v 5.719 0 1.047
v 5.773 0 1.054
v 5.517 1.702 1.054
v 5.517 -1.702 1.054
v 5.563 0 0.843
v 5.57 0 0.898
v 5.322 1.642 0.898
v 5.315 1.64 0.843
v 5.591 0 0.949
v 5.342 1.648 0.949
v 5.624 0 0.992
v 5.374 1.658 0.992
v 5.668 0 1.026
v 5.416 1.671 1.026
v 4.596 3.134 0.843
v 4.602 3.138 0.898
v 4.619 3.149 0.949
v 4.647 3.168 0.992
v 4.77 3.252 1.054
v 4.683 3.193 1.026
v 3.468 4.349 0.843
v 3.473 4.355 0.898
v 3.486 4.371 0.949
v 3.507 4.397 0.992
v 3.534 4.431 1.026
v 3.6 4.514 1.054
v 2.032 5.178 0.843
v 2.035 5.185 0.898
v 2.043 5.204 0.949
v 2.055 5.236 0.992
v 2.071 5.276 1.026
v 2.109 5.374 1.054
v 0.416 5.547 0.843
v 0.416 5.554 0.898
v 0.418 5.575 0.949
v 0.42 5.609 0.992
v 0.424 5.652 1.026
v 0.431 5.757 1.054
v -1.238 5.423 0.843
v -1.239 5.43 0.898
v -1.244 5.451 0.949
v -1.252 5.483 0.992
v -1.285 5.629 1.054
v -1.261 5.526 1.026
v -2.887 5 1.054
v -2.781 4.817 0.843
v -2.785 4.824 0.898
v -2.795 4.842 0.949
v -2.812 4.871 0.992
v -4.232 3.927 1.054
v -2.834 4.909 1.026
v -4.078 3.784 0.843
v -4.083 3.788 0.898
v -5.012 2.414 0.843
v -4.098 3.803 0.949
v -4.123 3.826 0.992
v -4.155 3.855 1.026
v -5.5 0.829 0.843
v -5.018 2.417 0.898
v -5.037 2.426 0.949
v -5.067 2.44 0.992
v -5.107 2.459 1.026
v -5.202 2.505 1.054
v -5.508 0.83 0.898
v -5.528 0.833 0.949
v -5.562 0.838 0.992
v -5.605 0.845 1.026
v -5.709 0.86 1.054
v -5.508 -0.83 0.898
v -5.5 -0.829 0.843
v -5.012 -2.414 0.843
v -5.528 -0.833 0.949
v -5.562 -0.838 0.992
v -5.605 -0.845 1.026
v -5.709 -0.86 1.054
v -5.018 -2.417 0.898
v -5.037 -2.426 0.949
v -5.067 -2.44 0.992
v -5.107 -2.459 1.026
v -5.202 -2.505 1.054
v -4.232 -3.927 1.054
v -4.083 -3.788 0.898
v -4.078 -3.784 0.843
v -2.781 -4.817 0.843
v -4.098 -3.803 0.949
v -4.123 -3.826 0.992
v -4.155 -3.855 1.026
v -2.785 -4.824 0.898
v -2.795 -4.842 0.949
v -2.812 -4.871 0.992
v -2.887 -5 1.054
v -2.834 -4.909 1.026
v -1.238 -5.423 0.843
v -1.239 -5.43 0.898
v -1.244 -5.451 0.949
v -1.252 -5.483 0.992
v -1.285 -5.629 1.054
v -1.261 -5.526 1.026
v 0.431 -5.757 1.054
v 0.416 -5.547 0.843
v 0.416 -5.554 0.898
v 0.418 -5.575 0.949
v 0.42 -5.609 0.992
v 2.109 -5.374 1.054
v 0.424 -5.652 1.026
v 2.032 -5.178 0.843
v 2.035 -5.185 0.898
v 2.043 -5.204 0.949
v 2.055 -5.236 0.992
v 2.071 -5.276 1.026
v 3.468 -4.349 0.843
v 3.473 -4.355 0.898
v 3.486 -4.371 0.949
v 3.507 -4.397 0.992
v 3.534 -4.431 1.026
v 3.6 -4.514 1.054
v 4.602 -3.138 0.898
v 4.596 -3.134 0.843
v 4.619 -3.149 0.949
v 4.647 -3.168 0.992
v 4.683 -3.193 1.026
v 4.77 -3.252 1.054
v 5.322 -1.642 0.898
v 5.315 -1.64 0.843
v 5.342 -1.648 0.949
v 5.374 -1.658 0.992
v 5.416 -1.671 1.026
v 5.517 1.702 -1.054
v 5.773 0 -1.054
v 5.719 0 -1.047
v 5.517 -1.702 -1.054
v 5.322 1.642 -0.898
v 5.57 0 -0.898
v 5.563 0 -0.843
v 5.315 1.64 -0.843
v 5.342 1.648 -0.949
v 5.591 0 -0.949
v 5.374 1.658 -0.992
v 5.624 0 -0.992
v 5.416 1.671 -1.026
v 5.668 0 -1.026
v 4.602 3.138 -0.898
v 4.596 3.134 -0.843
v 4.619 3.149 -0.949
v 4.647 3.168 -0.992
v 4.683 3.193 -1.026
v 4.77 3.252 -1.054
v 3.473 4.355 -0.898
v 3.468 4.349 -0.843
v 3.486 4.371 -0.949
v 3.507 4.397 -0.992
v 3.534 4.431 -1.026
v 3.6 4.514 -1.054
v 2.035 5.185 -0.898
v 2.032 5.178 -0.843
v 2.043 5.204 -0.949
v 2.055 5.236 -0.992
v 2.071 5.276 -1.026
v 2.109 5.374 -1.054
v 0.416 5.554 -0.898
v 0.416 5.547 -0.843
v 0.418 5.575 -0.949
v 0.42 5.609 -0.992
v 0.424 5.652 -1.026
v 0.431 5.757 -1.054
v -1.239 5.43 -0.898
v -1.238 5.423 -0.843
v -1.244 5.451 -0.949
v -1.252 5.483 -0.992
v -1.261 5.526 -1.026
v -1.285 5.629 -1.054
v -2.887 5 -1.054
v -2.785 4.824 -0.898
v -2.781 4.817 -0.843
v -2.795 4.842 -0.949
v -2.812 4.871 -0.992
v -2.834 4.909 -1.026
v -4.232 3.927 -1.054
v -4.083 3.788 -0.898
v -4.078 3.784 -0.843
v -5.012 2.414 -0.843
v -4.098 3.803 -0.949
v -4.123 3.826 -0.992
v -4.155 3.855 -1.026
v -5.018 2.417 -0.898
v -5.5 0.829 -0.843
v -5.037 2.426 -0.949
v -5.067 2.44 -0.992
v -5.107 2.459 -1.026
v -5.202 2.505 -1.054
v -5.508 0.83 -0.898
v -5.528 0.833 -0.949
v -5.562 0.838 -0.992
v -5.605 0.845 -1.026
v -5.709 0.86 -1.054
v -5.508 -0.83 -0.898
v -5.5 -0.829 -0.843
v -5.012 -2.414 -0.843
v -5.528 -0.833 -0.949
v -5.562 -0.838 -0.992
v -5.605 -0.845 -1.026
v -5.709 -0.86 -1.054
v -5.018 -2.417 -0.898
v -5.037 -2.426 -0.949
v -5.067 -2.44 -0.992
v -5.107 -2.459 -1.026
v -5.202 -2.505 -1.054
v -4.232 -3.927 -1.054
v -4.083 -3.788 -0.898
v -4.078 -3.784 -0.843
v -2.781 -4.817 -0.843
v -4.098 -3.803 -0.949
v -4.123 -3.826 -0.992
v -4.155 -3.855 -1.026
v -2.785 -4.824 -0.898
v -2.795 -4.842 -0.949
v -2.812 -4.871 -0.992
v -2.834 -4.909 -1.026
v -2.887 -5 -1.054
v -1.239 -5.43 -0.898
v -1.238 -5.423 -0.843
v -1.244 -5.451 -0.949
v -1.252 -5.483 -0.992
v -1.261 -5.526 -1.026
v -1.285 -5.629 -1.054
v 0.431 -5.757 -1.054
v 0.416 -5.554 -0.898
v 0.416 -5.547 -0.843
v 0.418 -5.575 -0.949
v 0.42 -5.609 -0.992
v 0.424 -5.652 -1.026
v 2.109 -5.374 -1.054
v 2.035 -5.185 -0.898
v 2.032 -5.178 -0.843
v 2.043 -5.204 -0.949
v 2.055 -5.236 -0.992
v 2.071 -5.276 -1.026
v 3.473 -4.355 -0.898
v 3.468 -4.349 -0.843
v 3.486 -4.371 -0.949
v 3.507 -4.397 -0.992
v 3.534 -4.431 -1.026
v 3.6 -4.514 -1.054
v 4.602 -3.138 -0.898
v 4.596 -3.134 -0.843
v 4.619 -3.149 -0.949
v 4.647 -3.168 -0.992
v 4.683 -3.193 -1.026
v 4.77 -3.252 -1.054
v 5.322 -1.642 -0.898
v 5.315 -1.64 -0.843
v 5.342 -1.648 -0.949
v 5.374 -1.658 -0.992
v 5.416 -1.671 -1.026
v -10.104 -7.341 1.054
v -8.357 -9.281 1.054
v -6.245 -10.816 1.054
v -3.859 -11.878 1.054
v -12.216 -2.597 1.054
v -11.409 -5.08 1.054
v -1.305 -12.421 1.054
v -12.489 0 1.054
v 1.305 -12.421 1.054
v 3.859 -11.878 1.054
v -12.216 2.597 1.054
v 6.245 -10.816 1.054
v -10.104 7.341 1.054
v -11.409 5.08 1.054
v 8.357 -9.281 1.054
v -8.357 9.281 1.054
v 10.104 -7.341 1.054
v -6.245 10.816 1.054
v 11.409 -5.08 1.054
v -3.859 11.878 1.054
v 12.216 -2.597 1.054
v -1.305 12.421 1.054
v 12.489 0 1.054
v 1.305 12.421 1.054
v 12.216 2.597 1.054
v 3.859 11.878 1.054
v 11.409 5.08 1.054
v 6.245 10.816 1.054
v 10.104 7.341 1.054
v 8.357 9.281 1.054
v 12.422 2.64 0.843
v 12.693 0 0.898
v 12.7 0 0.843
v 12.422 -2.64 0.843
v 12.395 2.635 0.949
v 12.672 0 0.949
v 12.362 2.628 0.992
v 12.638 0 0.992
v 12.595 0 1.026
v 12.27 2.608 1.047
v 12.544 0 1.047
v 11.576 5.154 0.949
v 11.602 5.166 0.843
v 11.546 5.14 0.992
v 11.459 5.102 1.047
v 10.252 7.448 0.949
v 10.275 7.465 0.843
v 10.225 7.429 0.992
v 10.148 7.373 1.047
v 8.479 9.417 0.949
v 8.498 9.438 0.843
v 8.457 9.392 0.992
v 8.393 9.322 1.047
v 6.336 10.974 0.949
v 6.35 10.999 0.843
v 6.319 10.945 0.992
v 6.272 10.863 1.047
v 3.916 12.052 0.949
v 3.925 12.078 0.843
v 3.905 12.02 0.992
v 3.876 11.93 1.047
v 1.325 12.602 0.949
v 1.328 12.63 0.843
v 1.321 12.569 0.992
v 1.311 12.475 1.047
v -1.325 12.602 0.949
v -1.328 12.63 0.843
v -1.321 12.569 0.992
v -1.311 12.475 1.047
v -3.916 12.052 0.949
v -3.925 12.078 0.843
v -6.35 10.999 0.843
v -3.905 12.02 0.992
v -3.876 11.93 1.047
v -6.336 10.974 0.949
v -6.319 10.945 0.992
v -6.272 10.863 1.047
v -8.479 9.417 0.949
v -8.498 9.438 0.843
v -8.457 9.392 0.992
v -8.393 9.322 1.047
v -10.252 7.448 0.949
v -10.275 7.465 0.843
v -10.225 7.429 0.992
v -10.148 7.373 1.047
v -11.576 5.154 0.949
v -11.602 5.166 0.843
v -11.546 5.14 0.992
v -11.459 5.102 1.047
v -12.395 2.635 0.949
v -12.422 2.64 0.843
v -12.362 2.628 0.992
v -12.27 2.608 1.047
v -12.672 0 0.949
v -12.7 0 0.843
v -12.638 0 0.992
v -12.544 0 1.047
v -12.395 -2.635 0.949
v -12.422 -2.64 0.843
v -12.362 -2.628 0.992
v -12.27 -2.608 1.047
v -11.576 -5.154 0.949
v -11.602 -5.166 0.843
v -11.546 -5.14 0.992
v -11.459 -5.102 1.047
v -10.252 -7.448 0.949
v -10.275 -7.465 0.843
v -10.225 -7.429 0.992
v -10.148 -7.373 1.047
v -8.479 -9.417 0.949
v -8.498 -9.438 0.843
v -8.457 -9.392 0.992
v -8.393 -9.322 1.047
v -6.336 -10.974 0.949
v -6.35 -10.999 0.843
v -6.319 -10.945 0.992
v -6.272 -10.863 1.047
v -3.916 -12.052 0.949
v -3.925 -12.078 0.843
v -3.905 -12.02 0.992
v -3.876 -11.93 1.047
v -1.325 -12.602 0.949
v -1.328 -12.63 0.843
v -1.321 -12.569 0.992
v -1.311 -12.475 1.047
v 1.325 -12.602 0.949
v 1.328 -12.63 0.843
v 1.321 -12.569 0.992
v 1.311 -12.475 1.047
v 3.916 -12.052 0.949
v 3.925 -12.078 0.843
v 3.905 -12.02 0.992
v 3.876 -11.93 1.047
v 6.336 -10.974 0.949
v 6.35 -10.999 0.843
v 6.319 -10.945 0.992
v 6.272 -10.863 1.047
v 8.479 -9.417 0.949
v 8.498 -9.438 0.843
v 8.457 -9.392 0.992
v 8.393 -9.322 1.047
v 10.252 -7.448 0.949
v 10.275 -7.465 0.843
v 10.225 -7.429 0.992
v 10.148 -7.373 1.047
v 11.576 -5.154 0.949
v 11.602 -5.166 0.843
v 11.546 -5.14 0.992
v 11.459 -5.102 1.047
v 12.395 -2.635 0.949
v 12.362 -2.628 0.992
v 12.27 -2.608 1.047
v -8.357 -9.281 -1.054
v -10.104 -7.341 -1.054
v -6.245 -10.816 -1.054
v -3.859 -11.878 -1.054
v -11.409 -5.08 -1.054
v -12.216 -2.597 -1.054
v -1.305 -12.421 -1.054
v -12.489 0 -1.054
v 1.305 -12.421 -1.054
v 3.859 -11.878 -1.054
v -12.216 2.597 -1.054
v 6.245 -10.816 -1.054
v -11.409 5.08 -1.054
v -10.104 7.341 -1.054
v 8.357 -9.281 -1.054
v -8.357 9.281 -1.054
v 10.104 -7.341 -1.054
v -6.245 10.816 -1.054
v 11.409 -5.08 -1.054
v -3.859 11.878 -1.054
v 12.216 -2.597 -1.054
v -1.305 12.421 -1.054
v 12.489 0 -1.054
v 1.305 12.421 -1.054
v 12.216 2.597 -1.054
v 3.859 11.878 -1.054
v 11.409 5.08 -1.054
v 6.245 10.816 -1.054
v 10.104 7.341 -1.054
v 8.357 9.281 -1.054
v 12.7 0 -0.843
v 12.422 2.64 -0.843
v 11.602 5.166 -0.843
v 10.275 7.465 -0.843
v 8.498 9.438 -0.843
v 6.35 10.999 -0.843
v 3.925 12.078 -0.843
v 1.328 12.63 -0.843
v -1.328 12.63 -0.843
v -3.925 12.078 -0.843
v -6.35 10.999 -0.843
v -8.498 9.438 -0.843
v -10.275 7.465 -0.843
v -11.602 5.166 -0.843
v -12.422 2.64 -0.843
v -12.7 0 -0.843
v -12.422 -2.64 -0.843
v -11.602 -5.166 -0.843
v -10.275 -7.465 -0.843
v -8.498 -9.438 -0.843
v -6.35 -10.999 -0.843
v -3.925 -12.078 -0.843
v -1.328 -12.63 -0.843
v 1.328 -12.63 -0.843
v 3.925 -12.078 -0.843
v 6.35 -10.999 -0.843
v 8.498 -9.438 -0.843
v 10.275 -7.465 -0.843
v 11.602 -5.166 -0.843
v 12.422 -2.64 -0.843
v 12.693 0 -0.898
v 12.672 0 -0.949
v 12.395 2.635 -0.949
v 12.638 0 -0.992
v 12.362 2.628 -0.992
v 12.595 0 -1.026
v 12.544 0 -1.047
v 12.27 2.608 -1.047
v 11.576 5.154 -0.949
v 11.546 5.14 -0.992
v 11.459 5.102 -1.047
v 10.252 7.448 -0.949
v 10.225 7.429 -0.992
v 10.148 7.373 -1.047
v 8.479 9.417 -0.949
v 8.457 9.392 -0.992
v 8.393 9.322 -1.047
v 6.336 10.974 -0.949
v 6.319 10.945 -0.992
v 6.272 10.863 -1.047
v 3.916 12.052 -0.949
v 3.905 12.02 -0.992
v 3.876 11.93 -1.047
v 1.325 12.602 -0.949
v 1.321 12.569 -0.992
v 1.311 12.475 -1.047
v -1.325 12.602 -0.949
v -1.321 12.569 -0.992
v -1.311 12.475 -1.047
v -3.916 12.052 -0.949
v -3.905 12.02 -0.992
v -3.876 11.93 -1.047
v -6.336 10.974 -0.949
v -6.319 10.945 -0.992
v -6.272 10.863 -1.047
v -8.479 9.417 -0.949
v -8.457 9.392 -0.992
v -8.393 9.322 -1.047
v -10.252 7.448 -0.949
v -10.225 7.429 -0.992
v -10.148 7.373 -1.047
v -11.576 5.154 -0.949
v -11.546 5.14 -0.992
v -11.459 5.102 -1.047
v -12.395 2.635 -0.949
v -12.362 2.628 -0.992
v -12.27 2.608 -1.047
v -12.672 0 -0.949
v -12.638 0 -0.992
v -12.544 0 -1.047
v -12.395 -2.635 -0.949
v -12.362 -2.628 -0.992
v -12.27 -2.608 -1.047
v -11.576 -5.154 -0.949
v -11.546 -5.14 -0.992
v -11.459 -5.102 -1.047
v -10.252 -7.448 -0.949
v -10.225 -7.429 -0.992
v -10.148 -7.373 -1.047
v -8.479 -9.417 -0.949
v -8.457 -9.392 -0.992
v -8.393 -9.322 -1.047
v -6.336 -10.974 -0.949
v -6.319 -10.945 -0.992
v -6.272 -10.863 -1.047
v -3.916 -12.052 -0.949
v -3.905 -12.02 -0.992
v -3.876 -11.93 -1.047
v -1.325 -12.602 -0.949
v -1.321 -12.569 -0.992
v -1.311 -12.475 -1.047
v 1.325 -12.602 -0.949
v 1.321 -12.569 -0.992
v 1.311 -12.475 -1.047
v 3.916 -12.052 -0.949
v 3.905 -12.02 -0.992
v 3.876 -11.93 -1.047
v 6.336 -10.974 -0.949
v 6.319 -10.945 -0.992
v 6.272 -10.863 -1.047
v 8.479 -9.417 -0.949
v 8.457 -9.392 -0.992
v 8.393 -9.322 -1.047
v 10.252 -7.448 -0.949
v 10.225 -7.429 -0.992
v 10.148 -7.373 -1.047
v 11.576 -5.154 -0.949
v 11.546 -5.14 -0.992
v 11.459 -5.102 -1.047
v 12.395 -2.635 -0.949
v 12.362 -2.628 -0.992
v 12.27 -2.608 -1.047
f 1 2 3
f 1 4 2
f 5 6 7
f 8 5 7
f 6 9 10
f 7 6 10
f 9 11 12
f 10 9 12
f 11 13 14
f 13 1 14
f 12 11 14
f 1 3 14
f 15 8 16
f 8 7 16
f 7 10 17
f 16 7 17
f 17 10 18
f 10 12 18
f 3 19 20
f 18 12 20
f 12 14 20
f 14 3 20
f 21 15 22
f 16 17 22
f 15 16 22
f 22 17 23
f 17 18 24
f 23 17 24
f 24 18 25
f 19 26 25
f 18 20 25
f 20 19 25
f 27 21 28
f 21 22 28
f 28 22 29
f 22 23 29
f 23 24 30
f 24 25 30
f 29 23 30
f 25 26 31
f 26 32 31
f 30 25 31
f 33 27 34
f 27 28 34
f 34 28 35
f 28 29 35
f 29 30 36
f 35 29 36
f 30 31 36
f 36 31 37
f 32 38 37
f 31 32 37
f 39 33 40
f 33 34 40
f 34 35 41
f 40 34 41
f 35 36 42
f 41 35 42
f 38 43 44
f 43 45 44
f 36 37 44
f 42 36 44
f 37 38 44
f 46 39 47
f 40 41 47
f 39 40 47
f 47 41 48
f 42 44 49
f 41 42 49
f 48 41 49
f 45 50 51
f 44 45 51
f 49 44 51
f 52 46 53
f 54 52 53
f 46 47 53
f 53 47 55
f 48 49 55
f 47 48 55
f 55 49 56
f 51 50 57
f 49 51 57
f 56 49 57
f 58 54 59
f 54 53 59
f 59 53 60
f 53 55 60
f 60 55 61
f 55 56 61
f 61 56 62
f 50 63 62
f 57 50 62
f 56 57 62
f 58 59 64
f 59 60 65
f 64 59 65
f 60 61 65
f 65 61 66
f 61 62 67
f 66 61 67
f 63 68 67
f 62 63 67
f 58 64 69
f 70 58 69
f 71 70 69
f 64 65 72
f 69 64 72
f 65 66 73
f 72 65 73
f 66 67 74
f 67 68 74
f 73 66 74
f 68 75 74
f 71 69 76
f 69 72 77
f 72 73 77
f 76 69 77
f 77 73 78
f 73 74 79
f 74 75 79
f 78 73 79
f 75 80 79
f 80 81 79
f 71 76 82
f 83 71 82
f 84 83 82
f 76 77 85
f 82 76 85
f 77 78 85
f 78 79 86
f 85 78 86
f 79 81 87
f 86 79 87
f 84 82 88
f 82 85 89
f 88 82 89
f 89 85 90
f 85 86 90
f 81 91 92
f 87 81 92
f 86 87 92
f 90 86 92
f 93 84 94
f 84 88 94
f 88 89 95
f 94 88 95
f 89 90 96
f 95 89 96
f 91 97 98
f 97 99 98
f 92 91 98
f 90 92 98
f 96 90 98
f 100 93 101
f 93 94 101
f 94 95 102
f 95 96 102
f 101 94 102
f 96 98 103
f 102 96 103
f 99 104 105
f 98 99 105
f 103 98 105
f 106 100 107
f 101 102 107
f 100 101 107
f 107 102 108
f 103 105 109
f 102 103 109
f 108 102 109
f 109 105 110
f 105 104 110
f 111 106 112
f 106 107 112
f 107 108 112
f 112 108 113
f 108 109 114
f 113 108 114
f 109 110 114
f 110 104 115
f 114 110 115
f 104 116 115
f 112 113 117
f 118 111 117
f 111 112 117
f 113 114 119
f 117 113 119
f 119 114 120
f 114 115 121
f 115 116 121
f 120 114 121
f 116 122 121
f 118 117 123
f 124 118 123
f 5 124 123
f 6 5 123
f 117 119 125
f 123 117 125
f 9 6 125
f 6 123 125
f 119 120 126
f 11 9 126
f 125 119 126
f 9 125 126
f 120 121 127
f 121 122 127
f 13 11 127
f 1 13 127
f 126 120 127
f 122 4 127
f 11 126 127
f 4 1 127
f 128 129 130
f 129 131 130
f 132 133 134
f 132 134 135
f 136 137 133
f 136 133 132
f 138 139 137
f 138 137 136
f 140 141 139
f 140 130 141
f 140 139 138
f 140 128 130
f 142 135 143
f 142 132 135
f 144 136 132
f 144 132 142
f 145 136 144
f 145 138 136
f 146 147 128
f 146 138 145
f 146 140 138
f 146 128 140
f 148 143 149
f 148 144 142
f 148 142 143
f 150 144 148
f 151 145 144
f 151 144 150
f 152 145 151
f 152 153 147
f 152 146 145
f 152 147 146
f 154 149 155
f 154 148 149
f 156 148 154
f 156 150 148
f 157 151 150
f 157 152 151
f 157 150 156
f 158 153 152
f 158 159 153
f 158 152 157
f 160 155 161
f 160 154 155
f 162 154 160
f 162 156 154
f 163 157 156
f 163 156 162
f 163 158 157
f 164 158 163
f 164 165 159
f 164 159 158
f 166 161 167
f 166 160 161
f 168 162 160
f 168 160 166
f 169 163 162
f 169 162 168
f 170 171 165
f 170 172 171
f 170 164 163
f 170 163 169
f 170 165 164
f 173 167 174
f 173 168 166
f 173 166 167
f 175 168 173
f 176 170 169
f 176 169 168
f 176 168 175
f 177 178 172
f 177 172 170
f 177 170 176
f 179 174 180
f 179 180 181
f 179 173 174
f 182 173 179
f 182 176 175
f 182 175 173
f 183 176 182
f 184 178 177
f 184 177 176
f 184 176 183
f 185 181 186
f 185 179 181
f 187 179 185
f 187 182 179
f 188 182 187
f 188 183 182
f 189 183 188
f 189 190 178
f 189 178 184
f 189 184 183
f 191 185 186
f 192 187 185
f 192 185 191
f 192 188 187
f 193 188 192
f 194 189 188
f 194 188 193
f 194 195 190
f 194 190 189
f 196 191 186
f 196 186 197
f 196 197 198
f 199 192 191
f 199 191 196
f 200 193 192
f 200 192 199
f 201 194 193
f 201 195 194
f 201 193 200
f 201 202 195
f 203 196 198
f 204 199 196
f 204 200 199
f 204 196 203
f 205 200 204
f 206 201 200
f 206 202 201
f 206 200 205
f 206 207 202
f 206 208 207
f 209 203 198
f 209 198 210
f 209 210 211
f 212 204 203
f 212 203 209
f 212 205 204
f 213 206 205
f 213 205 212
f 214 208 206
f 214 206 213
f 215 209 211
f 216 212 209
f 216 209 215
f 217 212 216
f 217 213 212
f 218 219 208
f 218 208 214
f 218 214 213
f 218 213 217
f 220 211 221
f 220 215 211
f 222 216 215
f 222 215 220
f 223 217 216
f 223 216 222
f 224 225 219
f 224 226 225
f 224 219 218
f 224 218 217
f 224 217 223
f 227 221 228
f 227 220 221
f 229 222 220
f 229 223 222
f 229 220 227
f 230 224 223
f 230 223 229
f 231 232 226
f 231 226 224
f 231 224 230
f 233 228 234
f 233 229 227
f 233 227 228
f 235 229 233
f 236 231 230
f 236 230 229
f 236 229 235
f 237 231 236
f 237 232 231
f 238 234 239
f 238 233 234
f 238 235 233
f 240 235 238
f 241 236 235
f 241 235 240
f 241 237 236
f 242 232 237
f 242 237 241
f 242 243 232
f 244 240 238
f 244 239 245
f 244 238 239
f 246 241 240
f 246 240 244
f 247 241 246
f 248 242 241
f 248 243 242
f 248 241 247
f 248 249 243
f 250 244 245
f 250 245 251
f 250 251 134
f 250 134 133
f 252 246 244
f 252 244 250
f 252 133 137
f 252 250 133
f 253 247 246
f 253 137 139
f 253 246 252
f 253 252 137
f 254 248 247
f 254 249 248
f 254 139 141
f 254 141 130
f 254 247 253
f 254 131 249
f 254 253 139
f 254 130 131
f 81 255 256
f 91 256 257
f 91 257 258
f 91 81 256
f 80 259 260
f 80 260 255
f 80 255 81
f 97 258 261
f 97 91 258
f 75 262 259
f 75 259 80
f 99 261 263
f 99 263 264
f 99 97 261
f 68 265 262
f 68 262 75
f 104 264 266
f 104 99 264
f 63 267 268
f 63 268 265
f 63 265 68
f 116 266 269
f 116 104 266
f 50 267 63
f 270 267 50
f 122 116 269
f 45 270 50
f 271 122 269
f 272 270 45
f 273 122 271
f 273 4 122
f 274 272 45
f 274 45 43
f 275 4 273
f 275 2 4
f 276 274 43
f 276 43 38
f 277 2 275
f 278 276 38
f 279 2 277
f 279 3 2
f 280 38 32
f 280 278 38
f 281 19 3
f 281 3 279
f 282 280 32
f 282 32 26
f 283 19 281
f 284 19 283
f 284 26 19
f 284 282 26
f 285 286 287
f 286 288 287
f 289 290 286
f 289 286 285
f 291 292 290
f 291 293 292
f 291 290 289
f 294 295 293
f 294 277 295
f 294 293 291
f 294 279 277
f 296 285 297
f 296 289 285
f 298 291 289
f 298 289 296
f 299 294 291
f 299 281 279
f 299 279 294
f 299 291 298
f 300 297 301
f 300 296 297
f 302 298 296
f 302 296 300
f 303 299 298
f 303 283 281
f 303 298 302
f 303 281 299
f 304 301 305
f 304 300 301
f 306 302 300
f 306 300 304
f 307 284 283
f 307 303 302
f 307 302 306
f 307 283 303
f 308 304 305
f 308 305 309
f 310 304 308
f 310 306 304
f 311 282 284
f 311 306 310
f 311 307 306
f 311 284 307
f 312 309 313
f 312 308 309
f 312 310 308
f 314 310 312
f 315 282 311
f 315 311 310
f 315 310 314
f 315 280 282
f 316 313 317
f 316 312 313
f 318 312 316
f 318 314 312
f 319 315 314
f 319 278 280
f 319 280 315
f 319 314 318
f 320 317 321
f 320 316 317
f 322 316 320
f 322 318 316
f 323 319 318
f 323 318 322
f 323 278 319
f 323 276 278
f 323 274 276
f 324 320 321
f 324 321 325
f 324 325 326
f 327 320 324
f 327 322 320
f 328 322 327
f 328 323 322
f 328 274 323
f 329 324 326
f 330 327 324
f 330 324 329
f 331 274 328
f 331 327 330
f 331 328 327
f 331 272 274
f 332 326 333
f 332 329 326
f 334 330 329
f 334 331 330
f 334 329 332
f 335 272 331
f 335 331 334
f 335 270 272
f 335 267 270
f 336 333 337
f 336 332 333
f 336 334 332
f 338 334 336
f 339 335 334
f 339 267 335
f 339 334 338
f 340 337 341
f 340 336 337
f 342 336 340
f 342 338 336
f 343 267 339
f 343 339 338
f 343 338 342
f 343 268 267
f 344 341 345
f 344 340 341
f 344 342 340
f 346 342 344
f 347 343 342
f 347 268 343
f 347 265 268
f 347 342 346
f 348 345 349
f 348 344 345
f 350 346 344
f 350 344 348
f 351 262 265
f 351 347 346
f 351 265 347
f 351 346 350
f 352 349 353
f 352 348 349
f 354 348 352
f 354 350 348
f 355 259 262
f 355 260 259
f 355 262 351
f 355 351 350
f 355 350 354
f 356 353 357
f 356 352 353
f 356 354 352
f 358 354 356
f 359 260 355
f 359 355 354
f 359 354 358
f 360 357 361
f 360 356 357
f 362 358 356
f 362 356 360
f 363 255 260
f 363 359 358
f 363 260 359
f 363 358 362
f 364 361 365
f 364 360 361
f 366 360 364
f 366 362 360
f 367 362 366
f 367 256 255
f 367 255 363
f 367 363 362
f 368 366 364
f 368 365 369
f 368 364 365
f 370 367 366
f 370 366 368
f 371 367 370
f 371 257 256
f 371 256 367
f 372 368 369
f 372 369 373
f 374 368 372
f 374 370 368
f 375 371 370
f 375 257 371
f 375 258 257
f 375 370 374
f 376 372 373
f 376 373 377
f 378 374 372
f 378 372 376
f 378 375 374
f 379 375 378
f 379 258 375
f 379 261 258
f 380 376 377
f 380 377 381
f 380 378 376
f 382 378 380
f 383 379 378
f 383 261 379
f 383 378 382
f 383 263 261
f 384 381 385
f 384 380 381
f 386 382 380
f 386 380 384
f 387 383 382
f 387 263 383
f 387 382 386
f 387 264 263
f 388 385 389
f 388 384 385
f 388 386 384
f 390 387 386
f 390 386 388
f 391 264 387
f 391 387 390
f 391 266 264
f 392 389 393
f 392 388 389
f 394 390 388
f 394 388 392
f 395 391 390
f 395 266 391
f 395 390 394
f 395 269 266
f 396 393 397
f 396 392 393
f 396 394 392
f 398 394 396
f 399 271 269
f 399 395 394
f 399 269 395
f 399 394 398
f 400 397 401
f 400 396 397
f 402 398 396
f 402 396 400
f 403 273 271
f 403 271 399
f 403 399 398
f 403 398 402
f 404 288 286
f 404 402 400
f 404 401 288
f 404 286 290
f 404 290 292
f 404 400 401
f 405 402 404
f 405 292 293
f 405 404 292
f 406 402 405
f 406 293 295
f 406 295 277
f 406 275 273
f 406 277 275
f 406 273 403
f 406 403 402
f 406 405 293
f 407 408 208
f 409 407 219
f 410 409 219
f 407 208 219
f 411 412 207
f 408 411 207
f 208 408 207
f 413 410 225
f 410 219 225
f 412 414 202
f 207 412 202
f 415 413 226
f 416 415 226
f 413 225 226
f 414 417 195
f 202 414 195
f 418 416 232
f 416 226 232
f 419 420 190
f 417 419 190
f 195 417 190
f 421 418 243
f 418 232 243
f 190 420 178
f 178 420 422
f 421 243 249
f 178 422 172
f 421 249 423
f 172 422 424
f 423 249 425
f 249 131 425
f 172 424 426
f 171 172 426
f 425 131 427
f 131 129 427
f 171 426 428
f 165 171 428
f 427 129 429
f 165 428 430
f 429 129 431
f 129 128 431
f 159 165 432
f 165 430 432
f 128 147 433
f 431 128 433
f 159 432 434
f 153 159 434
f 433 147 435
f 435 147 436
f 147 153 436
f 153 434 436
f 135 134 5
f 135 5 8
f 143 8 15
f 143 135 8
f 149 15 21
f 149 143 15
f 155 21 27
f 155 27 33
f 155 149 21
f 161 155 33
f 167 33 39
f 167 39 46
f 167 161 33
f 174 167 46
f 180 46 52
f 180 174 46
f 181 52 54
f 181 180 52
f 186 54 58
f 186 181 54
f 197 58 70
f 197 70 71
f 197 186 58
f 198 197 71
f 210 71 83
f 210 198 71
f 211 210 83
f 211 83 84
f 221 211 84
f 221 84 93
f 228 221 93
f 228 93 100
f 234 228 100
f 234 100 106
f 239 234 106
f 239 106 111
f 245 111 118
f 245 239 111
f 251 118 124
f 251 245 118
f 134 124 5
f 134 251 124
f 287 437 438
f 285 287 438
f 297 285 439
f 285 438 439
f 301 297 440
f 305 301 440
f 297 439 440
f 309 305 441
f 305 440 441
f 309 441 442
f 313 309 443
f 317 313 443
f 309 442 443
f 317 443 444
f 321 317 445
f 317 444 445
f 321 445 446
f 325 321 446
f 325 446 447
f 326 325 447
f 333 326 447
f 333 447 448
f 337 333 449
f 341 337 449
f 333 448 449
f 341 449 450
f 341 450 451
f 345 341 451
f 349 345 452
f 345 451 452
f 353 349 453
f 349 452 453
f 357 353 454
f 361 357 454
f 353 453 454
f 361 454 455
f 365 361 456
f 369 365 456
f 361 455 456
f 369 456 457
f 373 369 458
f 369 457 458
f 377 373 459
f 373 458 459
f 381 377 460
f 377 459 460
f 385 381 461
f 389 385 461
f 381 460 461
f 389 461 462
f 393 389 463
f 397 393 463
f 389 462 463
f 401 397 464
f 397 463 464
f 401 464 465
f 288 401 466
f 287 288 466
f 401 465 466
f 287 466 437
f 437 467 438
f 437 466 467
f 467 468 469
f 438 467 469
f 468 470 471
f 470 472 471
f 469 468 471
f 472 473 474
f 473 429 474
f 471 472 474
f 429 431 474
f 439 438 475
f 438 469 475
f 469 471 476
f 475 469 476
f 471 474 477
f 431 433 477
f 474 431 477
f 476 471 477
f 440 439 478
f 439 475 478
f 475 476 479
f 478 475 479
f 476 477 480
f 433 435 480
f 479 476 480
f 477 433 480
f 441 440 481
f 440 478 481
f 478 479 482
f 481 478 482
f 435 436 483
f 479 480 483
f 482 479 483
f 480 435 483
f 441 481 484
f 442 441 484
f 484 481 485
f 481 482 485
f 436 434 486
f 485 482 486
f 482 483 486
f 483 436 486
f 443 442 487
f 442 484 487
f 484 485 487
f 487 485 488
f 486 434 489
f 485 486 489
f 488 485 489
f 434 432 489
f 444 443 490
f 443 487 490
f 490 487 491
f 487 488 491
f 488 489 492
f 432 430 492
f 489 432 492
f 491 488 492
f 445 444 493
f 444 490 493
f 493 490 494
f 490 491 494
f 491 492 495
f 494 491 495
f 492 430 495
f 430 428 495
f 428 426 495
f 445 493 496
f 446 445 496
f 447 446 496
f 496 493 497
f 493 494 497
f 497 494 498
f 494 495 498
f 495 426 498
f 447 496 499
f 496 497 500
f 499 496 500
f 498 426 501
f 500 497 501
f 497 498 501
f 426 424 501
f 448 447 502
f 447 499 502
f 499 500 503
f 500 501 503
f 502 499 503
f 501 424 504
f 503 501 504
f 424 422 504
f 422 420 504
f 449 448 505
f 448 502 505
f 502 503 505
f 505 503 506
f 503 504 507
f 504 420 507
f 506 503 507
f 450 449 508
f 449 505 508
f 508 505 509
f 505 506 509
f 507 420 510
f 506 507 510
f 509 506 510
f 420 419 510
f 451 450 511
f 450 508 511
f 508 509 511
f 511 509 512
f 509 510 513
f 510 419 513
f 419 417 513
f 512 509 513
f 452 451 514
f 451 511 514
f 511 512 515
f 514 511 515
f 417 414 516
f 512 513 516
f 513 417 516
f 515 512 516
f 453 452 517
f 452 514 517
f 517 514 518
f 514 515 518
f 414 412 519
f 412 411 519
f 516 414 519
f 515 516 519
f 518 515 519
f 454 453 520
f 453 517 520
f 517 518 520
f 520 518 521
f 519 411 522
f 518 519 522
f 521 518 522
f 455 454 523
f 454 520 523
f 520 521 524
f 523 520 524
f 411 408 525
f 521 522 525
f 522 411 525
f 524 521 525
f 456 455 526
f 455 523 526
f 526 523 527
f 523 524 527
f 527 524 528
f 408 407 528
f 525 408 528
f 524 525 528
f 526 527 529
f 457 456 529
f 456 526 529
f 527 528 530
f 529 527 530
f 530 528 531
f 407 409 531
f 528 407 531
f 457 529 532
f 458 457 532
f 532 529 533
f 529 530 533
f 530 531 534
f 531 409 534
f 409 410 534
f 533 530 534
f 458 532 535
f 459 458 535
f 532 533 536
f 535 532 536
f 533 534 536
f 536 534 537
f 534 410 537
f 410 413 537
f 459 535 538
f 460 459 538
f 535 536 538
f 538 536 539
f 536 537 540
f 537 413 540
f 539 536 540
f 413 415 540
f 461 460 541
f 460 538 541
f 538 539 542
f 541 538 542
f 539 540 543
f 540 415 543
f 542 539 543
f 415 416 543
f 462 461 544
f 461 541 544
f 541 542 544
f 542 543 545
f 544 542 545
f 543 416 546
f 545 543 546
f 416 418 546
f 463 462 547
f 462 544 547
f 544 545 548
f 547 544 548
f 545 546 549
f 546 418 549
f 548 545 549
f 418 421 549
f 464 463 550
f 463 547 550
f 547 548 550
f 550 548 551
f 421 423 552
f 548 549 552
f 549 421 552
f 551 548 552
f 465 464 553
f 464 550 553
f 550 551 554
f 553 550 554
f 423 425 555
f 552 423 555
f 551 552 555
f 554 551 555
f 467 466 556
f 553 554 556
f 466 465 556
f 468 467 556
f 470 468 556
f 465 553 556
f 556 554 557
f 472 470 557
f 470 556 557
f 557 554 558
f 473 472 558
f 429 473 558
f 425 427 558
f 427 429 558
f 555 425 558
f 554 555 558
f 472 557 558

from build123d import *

# Parameters (mm, degrees)
BOSS_EXTRUDE1_DEPTH      = 1.0541
BOSS_EXTRUDE1_DEPTH_BACK = 1.0541
SKETCH3_R                = 12.7
SKETCH3_R_2              = 5.5626
FILLET1_R                = 0.21082


with BuildPart() as part:
    # Sketch3 → Boss-Extrude1 (new, two sides: drawn at the far end of the back side and taken through both)
    with BuildSketch(Plane.XY.offset(-BOSS_EXTRUDE1_DEPTH_BACK)):
        Circle(SKETCH3_R)
        Circle(SKETCH3_R_2, mode=Mode.SUBTRACT)
    extrude(amount=BOSS_EXTRUDE1_DEPTH + BOSS_EXTRUDE1_DEPTH_BACK)

    # Fillet1
    fillet1_edges = [part.edges().sort_by_distance(p)[0] for p in [
        (-12.7, 0, -1.0541),
        (-5.5626, 0, -1.0541),
        (-12.7, 0, 1.0541),
        (-5.5626, 0, 1.0541),
    ]]
    fillet(fillet1_edges, radius=FILLET1_R)


solid = part.part
